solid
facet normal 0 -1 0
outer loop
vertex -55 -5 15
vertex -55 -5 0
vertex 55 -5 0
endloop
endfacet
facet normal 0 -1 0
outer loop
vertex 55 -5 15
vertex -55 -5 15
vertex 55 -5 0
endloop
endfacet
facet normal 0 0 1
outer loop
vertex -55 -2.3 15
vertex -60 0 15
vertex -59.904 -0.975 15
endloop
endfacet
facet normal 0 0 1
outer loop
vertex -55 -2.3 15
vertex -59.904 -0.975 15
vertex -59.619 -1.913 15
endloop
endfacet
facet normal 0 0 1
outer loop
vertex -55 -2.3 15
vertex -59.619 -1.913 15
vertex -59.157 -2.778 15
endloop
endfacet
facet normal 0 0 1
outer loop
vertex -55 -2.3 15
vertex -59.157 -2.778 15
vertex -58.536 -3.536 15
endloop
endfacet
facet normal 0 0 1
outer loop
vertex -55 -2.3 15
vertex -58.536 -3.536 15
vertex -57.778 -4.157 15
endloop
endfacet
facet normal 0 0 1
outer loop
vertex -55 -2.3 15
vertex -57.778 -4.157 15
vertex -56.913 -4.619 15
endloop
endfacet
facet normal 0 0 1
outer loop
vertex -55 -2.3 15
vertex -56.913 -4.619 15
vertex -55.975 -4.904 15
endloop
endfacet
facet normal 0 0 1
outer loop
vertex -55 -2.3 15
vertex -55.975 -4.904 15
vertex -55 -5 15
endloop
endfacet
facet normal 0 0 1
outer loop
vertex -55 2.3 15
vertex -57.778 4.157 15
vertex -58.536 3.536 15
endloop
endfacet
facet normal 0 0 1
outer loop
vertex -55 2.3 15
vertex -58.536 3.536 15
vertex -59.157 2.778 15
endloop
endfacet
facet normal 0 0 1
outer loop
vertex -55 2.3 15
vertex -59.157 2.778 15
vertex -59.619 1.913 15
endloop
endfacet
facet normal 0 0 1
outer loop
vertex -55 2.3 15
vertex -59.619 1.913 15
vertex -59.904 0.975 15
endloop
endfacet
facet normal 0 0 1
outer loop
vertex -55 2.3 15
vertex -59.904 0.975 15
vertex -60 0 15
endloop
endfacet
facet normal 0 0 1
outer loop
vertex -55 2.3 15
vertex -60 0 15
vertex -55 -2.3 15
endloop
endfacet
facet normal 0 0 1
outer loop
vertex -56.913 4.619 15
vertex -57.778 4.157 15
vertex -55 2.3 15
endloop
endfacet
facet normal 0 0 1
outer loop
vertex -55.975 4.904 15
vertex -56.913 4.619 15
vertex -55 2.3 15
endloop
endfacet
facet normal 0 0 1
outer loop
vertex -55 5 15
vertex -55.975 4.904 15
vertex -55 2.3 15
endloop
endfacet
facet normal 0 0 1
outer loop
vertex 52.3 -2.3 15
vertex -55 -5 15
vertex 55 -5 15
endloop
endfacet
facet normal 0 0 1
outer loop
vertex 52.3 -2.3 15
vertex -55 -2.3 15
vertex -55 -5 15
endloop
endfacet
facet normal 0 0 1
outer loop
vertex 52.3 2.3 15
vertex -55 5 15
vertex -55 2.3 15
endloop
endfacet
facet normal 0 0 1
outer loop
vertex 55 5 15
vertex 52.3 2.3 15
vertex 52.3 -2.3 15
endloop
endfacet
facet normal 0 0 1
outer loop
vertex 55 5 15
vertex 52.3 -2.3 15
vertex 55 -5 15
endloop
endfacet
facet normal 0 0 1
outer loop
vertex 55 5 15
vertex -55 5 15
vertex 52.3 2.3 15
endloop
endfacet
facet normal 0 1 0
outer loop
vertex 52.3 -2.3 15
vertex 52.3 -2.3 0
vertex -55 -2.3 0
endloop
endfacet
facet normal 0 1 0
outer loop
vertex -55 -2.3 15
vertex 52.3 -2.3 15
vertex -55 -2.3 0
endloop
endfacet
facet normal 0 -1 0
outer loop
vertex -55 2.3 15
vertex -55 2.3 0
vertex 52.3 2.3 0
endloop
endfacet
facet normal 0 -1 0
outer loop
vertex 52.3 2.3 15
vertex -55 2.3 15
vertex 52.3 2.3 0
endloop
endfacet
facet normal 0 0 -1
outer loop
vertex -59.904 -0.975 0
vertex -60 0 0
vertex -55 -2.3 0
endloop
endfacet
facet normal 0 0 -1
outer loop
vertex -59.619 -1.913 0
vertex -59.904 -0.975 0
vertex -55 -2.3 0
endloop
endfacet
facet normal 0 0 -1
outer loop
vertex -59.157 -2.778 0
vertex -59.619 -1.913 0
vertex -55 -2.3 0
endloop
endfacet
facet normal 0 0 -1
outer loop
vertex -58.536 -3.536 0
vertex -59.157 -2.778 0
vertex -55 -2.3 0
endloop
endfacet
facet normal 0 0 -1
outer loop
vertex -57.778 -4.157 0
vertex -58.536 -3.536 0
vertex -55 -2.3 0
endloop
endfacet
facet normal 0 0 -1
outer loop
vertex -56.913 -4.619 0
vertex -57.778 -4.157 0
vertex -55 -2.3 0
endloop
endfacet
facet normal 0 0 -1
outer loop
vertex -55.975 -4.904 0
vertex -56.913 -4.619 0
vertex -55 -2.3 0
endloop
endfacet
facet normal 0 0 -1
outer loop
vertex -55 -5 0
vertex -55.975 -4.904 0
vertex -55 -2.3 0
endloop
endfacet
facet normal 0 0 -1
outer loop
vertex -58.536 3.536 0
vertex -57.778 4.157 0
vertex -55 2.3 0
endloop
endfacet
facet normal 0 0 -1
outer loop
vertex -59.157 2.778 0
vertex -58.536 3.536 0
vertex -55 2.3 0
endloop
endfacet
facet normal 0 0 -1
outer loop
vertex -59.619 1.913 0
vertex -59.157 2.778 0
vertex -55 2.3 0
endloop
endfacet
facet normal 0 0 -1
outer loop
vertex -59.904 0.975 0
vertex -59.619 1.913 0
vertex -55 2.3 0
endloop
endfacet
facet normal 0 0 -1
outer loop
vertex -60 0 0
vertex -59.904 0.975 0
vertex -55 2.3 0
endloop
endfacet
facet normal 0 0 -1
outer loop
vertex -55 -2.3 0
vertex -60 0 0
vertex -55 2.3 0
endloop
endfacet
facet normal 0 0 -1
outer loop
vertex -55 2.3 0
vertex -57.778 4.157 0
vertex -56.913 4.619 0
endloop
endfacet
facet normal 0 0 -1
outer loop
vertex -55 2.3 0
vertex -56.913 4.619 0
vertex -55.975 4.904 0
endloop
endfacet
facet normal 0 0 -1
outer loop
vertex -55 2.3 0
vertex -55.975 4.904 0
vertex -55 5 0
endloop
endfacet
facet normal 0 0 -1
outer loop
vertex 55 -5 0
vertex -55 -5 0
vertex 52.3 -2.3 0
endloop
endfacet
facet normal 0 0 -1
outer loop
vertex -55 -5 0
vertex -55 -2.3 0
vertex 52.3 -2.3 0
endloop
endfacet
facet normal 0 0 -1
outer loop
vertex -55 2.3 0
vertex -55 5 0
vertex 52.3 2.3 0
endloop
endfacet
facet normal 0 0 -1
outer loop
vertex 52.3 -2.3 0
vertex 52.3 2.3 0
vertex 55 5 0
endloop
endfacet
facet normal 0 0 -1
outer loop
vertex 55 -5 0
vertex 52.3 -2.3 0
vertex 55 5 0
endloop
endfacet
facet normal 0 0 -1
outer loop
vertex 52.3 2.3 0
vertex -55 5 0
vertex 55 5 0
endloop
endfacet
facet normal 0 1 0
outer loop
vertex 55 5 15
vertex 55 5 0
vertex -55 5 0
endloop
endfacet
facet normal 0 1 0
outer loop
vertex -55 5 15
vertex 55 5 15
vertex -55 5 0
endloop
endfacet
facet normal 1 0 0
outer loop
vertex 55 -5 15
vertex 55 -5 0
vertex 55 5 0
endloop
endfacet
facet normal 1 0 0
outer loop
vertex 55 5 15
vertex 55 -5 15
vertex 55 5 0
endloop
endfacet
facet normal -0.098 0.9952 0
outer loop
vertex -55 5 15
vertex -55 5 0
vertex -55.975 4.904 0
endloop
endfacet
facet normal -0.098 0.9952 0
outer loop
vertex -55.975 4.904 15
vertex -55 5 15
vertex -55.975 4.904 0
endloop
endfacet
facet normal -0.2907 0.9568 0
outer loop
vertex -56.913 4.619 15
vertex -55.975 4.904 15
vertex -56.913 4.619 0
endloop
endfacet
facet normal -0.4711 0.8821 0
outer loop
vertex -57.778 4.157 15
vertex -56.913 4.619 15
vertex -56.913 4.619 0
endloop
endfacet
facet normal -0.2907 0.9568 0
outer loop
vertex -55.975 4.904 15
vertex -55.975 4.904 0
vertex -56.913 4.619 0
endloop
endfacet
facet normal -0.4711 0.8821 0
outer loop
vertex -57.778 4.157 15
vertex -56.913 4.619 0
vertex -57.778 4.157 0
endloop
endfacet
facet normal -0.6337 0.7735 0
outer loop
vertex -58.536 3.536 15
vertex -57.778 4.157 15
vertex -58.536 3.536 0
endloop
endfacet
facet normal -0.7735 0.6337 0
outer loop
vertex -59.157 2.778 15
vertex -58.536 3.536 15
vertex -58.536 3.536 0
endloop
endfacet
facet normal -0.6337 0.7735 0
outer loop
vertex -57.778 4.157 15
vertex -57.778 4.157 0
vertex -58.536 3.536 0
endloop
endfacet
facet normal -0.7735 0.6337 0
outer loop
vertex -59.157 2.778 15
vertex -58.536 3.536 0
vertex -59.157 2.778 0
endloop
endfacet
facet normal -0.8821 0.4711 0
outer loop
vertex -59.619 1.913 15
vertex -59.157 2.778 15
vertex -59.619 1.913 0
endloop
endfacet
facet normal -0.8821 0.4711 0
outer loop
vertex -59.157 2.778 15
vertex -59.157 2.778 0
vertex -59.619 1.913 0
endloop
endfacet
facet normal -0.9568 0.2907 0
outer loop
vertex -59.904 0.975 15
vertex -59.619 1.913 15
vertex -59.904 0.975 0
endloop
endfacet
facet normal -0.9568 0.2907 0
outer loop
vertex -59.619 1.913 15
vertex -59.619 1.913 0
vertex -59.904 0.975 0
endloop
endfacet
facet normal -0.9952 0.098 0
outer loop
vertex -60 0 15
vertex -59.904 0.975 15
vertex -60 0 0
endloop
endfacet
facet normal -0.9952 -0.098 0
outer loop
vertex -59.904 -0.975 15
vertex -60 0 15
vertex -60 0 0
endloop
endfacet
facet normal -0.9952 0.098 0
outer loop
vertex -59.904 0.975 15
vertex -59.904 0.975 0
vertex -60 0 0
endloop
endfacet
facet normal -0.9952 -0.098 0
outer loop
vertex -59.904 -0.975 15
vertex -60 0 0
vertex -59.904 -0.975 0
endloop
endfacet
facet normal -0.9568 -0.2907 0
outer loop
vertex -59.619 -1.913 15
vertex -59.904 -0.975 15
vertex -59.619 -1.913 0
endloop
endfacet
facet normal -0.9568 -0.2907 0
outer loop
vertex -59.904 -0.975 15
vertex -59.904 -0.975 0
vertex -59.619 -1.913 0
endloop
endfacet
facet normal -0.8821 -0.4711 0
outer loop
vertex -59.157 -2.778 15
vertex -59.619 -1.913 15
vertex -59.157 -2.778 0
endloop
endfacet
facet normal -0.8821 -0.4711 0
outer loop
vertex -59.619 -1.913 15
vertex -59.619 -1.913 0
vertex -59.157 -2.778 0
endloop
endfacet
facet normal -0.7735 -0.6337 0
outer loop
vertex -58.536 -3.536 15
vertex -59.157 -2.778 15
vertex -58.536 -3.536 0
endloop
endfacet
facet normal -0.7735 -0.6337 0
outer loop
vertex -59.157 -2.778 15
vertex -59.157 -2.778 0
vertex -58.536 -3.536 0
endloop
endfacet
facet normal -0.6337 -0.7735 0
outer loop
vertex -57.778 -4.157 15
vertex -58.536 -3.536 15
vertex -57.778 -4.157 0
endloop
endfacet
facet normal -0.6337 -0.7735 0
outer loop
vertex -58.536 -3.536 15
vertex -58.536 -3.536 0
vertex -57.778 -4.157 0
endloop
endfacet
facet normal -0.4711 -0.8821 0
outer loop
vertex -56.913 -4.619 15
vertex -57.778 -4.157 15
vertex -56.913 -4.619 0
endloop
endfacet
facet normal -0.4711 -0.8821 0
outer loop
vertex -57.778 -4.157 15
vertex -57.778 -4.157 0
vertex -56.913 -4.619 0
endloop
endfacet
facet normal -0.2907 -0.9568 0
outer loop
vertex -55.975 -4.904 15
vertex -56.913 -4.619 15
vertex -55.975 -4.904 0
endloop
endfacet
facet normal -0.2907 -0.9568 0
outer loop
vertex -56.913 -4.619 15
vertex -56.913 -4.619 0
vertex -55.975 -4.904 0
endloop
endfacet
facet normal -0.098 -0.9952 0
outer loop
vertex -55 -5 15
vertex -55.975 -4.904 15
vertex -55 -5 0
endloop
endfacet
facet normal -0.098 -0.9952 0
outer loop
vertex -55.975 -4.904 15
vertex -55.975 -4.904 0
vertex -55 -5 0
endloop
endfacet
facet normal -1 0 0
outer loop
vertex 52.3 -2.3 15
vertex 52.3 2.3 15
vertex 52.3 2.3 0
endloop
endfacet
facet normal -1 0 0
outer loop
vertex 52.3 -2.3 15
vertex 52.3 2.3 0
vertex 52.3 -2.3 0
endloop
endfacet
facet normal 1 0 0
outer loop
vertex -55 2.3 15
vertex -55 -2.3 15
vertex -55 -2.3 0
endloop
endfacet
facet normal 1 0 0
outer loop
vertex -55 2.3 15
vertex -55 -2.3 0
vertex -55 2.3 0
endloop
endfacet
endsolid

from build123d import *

# Parameters (mm, degrees)
F1_DEPTH = 15


with BuildPart() as f1:
    # F0 (on Top) → F1 (new body)
    with BuildSketch(Plane.XY):
        Polygon((-55, -2.3), (-55, -5), (55, -5), (55, 5), (-55, 5), (-55, 2.3), (52.3, 2.3), (52.3, -2.3), align=None)
        with BuildLine():
            ThreePointArc((-55, 5), (-60, 0), (-55, -5))
            Line((-55, -5), (-55, -2.3))
            ThreePointArc((-55, -2.3), (-57.3, 0), (-55, 2.3))
            Line((-55, 2.3), (-55, 5))
        make_face()
        with BuildLine():
            ThreePointArc((-55, 2.3), (-57.3, 0), (-55, -2.3))
            Line((-55, -2.3), (-55, 2.3))
        make_face()
    extrude(amount=F1_DEPTH)


solid = f1.part
